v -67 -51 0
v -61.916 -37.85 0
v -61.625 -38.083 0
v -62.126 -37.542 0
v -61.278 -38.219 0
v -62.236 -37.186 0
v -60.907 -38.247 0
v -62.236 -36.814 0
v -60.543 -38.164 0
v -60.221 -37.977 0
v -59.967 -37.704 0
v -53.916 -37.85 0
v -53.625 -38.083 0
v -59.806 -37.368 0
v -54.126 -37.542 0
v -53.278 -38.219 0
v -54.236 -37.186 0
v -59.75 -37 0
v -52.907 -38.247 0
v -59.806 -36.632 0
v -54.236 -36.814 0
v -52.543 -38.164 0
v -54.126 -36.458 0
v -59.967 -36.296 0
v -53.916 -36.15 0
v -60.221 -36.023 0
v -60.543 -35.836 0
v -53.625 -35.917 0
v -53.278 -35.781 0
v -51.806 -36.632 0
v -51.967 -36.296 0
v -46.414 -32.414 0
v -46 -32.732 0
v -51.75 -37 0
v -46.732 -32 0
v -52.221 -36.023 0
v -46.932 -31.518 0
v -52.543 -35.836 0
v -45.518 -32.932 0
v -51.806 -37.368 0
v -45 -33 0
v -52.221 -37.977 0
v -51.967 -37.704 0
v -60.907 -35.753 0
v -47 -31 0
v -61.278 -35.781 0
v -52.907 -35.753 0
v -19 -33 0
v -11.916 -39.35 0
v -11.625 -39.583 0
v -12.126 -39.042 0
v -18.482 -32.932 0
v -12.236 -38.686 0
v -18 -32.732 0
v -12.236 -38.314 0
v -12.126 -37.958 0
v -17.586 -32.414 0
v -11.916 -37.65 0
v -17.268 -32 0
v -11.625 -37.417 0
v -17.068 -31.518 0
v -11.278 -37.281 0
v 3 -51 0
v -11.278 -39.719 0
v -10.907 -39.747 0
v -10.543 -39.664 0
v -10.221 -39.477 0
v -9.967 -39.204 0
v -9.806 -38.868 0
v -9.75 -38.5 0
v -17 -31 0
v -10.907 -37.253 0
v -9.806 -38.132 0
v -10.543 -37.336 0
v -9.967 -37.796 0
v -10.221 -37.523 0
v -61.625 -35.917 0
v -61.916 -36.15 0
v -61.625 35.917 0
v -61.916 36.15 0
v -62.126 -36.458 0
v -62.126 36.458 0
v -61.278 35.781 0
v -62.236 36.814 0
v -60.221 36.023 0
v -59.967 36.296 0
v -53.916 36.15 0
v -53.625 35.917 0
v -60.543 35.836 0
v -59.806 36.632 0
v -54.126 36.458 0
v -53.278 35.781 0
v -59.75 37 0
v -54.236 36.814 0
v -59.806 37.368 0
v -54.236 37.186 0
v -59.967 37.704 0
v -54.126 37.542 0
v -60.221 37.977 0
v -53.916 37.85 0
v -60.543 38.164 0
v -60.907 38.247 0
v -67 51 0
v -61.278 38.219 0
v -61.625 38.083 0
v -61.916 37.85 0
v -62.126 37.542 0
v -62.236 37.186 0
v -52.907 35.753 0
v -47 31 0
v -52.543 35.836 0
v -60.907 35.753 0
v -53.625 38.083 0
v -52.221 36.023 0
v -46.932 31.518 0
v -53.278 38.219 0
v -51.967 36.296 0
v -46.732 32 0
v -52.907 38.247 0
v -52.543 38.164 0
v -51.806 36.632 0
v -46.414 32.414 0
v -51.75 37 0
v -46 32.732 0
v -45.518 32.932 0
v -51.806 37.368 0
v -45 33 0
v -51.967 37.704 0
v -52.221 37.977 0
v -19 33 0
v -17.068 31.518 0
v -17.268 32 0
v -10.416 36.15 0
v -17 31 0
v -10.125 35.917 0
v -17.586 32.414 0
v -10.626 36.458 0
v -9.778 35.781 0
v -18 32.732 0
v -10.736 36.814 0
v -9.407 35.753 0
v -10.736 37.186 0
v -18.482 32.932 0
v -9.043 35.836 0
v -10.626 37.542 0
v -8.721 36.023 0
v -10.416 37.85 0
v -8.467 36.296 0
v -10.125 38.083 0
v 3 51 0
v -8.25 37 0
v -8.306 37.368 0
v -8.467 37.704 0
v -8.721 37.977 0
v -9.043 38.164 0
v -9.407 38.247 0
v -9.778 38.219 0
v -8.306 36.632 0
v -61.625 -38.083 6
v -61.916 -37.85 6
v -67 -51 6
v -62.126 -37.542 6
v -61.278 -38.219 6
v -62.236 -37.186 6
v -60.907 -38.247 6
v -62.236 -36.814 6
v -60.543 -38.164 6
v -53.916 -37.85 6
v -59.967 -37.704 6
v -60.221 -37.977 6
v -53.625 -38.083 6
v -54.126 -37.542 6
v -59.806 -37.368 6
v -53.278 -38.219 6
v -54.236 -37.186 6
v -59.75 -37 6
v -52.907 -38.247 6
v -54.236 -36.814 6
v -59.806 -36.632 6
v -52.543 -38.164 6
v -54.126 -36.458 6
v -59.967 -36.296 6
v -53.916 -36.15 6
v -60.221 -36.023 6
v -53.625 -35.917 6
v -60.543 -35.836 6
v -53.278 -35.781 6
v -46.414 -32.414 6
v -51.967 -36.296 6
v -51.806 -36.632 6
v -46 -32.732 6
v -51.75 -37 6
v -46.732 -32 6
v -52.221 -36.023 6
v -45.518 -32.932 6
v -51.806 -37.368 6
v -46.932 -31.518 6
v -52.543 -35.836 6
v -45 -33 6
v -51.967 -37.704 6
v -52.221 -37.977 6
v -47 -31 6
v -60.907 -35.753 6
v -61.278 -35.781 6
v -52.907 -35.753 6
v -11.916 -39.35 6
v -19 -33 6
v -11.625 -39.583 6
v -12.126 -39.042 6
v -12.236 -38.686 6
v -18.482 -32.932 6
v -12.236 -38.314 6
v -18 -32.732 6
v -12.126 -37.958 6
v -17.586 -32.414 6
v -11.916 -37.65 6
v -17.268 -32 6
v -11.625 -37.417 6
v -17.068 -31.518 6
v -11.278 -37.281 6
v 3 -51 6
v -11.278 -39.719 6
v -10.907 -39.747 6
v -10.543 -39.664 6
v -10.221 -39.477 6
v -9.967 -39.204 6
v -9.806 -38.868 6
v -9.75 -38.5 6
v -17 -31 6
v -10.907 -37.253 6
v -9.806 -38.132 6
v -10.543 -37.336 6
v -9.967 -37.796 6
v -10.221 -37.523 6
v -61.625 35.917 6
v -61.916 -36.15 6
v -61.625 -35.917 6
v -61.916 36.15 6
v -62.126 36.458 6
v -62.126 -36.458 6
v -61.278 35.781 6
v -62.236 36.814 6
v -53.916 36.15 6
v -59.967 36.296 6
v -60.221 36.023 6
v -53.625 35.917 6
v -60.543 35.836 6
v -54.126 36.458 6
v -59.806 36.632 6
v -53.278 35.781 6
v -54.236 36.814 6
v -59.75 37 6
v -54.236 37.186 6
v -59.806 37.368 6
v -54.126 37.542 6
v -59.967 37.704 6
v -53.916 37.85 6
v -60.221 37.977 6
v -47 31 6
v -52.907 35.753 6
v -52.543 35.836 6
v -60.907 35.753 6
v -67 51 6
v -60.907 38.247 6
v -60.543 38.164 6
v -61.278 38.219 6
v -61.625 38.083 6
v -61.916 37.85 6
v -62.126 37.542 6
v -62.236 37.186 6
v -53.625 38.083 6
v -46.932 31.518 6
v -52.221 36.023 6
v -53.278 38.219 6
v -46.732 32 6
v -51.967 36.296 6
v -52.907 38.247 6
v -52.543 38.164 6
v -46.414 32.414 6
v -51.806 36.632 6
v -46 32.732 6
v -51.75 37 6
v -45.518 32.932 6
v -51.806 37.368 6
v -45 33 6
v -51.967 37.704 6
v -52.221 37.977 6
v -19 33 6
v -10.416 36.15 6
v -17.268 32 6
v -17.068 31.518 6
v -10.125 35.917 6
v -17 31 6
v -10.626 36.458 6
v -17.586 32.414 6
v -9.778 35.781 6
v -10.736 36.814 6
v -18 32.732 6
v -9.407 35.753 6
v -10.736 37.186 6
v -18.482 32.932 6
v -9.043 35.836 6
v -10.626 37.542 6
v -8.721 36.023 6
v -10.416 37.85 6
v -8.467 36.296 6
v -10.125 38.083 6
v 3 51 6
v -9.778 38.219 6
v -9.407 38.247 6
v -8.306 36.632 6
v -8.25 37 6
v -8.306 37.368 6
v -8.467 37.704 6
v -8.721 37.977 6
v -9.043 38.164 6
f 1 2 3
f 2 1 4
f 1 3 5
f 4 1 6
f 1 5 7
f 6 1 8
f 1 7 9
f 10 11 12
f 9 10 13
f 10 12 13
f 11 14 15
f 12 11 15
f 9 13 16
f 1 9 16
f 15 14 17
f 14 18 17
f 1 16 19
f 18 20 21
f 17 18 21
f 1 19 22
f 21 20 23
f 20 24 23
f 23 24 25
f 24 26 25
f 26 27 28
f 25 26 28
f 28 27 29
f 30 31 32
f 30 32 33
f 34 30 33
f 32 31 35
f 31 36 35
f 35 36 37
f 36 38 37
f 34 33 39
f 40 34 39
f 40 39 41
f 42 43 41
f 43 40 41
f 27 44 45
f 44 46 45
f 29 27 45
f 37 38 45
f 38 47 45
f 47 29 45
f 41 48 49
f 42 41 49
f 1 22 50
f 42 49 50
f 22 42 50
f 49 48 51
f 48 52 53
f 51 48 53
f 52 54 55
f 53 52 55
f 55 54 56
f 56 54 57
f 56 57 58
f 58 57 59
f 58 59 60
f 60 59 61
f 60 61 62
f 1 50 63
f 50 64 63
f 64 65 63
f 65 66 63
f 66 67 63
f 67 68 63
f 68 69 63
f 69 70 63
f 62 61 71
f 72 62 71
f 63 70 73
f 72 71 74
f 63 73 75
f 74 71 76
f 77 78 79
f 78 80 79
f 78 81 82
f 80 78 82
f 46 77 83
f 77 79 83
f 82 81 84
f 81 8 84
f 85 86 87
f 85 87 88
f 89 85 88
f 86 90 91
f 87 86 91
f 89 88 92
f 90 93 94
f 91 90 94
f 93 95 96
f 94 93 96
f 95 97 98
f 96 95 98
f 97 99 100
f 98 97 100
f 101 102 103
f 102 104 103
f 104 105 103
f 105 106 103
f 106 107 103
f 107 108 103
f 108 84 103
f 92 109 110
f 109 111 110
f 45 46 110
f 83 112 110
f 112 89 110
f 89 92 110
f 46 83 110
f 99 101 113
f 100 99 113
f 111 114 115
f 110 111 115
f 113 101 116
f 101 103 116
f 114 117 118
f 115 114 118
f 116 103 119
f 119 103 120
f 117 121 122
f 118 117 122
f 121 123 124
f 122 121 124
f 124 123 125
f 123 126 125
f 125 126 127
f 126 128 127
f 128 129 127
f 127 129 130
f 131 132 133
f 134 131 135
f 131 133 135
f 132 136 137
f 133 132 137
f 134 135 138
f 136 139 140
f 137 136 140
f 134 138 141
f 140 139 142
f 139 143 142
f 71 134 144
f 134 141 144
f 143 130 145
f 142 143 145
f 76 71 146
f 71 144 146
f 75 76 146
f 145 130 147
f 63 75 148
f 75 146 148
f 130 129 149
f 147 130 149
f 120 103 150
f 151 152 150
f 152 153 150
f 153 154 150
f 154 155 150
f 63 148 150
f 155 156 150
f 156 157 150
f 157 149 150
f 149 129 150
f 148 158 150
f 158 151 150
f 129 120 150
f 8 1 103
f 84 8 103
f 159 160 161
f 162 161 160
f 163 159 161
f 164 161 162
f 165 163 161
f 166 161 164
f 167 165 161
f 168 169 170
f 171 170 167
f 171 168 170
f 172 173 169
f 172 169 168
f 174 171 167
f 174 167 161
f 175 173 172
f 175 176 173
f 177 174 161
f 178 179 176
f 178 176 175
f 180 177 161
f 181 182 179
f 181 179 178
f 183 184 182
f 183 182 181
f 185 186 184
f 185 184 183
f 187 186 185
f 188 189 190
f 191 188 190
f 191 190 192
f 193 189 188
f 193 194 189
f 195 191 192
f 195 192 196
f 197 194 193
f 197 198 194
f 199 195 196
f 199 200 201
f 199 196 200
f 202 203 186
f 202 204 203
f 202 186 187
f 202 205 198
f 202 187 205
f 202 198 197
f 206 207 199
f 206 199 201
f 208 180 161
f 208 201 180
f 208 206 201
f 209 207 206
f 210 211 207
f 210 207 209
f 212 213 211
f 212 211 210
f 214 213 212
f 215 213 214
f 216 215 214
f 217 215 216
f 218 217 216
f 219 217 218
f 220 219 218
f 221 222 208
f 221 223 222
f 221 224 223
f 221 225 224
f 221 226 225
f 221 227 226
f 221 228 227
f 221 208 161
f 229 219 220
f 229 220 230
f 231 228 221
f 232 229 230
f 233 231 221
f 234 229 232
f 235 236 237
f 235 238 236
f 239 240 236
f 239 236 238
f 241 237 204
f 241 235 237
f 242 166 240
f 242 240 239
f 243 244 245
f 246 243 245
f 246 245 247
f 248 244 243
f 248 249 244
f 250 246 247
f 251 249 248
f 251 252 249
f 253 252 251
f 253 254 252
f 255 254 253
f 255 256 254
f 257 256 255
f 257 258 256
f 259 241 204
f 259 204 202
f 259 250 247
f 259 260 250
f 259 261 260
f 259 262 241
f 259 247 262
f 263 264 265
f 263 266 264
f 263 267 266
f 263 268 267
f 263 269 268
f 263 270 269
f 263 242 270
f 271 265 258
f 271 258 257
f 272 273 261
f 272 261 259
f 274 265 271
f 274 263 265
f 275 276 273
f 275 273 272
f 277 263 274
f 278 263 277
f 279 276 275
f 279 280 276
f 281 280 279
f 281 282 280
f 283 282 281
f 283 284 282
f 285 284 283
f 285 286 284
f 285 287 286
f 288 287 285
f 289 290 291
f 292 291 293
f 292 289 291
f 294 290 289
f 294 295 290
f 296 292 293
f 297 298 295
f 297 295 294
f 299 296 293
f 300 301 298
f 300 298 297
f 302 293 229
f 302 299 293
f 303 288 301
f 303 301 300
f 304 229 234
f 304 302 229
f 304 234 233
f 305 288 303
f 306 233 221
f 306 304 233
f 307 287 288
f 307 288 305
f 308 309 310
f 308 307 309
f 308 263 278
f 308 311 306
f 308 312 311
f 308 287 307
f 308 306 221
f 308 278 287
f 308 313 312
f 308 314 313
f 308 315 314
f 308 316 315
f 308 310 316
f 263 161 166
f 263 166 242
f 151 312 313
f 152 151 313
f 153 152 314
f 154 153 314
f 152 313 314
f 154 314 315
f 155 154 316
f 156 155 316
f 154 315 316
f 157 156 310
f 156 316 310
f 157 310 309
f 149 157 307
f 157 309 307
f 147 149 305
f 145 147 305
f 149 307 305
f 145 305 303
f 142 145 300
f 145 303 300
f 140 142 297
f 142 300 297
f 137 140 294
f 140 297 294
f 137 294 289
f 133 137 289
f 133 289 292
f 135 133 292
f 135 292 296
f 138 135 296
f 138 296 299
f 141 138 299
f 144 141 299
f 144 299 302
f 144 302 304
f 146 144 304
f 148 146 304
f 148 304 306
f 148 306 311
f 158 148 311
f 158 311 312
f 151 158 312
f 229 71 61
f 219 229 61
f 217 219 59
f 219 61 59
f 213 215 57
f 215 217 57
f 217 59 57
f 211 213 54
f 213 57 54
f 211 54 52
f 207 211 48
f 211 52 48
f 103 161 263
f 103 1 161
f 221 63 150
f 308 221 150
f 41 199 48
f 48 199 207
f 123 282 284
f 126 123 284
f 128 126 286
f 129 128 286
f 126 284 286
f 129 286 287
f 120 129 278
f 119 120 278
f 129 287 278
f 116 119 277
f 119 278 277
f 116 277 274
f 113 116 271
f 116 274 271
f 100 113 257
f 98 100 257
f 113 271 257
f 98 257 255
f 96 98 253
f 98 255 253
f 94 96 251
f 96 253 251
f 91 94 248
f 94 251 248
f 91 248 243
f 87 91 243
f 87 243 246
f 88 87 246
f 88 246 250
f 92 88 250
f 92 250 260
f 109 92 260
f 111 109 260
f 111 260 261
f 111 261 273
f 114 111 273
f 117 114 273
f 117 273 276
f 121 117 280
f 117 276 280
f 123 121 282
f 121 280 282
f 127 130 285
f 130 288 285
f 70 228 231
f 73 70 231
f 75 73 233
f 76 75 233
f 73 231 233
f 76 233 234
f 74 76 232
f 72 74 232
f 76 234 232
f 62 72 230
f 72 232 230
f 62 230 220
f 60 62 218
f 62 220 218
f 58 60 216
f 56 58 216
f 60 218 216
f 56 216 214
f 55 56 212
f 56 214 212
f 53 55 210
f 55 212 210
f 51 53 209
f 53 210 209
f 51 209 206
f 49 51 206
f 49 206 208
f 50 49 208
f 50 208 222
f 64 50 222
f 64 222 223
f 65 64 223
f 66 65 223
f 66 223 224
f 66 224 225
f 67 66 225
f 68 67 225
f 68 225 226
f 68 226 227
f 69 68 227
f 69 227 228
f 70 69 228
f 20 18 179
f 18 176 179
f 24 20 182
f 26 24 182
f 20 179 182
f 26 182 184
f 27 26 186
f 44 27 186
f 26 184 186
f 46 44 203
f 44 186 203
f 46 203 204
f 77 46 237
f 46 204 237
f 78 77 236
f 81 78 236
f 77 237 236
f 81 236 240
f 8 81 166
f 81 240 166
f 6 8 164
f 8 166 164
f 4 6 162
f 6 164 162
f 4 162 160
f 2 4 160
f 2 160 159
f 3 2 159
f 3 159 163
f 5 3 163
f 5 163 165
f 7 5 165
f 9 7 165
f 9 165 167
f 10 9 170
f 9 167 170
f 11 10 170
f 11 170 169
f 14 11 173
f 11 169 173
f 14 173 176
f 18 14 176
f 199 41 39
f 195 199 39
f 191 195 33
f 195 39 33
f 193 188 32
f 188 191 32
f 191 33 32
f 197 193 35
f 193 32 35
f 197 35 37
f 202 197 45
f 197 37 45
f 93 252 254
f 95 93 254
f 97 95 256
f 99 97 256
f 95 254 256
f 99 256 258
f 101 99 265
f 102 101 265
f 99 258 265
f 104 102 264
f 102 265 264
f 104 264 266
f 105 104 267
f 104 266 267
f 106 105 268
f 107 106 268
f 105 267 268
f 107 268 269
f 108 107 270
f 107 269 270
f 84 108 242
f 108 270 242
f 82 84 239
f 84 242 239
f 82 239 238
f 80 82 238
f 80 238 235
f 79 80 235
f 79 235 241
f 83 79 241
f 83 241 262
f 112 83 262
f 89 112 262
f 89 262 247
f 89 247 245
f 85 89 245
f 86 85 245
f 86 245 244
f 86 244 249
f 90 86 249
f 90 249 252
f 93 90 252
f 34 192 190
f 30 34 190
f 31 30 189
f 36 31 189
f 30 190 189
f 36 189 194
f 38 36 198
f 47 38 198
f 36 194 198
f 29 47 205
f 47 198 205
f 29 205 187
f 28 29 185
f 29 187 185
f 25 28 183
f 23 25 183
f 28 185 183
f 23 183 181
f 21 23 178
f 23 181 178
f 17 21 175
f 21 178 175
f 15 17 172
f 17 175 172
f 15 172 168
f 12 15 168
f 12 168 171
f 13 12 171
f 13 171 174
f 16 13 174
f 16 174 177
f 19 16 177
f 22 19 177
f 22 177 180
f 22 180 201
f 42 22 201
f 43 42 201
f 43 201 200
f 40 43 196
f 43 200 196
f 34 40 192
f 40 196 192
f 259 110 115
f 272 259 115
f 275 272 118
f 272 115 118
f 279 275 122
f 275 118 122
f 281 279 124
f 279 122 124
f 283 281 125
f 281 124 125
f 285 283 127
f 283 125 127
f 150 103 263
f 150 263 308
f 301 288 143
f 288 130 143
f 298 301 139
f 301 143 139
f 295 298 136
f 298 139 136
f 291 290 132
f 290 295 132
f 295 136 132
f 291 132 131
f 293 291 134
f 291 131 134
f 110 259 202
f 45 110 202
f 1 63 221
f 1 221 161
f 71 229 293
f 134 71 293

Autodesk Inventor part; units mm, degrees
ref_plane "YZ Plane" through (0, 0, 0) normal (1, 0, 0) x (0, 1, 0)
ref_plane "XZ Plane" through (0, 0, 0) normal (0, 1, 0) x (-1, 0, 0)
ref_plane "XY Plane" through (0, 0, 0) normal (0, 0, 1) x (1, 0, 0)
ref_plane "작업 평면1" through (-67, 45, 0) normal (0, 0, 1) x (1, 0, 0)
sketch "스케치1" plane through (-67, 45, 0) normal (0, 0, 1) x (1, 0, 0)
  line L0 (0, 0) -> (70, 0) projected
  line L1 (70, 0) -> (70, 6) projected
  line L2 (0, 6) -> (70, 6) projected
  line L3 (0, 0) -> (0, 6) projected
  line L4 (70, 0) -> (64, 0) projected
  line L5 (64, 0) -> (64, -90) projected
  line L6 (64, -90) -> (70, -90) projected
  line L7 (70, -90) -> (70, 0) projected
  line L8 (70, -90) -> (0, -90) projected
  line L9 (0, -90) -> (0, -96) projected
  line L10 (70, -96) -> (0, -96) projected
  line L11 (70, -90) -> (70, -96) projected
  line L12 (70, 6) -> (0, 6)
  line L13 (0, 6) -> (0, -96)
  line L14 (0, -96) -> (70, -96)
  line L15 (70, -96) -> (70, 6)
  point P0 (67, -45)
extrude "돌출1" add sketch "스케치1" along normal blind 6
sketch "스케치2" plane through (-67, 45, 6) normal (0, 0, 1) x (1, 0, 0)
  circle A0 centre (6, -8) radius 1.25 projected
  circle A1 centre (14, -8) radius 1.25 projected
  line L0 (20, -3) -> (0, -3) projected
  line L1 (20, -3) -> (20, -13) projected
  line L2 (0, -13) -> (20, -13) projected
  line L3 (0, -3) -> (0, -13) projected
  circle A2 centre (57.5, -8) radius 1.25 projected
  line L4 (61, -13) -> (61, -3) projected
  line L5 (54, -13) -> (61, -13) projected
  line L6 (54, -3) -> (54, -13) projected
  line L7 (61, -3) -> (54, -3) projected
  circle A3 centre (56, -83.5) radius 1.25 projected
  line L8 (51, -87) -> (61, -87) projected
  line L9 (51, -80) -> (51, -87) projected
  line L10 (61, -80) -> (51, -80) projected
  line L11 (61, -87) -> (61, -80) projected
  circle A4 centre (14, -82) radius 1.25 projected
  circle A5 centre (6, -82) radius 1.25 projected
  line L12 (0, -87) -> (20, -87) projected
  line L13 (0, -87) -> (0, -77) projected
  line L14 (20, -77) -> (0, -77) projected
  line L15 (20, -87) -> (20, -77) projected
  point P0 (67, -45)
extrude "돌출2" cut sketch "스케치2" against normal blind 6 contours A0 | A1 | A2 | A3 | A4 | A5
sketch "스케치3" plane through (-67, 45, 6) normal (0, 0, 1) x (1, 0, 0)
  circle A0 centre (57.5, -8) radius 1.25 projected
  circle A1 centre (6, -82) radius 1.25 projected
  circle A2 centre (14, -8) radius 1.25 projected
  circle A3 centre (56, -83.5) radius 1.25 projected
  circle A4 centre (14, -82) radius 1.25 projected
  circle A5 centre (6, -8) radius 1.25 projected
  line L0 (0, 6) -> (0, -96) projected
  line L1 (0, -96) -> (70, -96) projected
  line L2 (70, -96) -> (70, 6) projected
  line L3 (70, 6) -> (0, 6) projected
  line L4 (70, -96) -> (70, 6) projected
  line L5 (0, 6) -> (0, -96) projected
  line L6 (0, -96) -> (70, -96) projected
  line L7 (70, 6) -> (0, 6) projected
  line L8 (20, -78) -> (50, -78)
  line L9 (50, -78) -> (50, -12)
  line L10 (50, -12) -> (20, -12)
  line L11 (20, -12) -> (20, -78)
  point P0 (67, -45)
  point P1 (50, -64.8252)
  point P2 (20, -61.3274)
  point P3 (30.9806, -78)
  point P4 (28.8515, -12)
  point P5 (28.8515, -12)
  dimension "d4" = 20
  dimension "d5" = 20
  dimension "d6" = 18
  dimension "d7" = 18
extrude "돌출3" cut sketch "스케치3" against normal blind 6 contours L11 L10 L9 L8
fillet "모깎기1" radius 2 4 edges at (-47, -33, 3) (-17, -33, 3) (-47, 33, 3) (-17, 33, 3)
properties part number "62" material "아크릴, 선명"
